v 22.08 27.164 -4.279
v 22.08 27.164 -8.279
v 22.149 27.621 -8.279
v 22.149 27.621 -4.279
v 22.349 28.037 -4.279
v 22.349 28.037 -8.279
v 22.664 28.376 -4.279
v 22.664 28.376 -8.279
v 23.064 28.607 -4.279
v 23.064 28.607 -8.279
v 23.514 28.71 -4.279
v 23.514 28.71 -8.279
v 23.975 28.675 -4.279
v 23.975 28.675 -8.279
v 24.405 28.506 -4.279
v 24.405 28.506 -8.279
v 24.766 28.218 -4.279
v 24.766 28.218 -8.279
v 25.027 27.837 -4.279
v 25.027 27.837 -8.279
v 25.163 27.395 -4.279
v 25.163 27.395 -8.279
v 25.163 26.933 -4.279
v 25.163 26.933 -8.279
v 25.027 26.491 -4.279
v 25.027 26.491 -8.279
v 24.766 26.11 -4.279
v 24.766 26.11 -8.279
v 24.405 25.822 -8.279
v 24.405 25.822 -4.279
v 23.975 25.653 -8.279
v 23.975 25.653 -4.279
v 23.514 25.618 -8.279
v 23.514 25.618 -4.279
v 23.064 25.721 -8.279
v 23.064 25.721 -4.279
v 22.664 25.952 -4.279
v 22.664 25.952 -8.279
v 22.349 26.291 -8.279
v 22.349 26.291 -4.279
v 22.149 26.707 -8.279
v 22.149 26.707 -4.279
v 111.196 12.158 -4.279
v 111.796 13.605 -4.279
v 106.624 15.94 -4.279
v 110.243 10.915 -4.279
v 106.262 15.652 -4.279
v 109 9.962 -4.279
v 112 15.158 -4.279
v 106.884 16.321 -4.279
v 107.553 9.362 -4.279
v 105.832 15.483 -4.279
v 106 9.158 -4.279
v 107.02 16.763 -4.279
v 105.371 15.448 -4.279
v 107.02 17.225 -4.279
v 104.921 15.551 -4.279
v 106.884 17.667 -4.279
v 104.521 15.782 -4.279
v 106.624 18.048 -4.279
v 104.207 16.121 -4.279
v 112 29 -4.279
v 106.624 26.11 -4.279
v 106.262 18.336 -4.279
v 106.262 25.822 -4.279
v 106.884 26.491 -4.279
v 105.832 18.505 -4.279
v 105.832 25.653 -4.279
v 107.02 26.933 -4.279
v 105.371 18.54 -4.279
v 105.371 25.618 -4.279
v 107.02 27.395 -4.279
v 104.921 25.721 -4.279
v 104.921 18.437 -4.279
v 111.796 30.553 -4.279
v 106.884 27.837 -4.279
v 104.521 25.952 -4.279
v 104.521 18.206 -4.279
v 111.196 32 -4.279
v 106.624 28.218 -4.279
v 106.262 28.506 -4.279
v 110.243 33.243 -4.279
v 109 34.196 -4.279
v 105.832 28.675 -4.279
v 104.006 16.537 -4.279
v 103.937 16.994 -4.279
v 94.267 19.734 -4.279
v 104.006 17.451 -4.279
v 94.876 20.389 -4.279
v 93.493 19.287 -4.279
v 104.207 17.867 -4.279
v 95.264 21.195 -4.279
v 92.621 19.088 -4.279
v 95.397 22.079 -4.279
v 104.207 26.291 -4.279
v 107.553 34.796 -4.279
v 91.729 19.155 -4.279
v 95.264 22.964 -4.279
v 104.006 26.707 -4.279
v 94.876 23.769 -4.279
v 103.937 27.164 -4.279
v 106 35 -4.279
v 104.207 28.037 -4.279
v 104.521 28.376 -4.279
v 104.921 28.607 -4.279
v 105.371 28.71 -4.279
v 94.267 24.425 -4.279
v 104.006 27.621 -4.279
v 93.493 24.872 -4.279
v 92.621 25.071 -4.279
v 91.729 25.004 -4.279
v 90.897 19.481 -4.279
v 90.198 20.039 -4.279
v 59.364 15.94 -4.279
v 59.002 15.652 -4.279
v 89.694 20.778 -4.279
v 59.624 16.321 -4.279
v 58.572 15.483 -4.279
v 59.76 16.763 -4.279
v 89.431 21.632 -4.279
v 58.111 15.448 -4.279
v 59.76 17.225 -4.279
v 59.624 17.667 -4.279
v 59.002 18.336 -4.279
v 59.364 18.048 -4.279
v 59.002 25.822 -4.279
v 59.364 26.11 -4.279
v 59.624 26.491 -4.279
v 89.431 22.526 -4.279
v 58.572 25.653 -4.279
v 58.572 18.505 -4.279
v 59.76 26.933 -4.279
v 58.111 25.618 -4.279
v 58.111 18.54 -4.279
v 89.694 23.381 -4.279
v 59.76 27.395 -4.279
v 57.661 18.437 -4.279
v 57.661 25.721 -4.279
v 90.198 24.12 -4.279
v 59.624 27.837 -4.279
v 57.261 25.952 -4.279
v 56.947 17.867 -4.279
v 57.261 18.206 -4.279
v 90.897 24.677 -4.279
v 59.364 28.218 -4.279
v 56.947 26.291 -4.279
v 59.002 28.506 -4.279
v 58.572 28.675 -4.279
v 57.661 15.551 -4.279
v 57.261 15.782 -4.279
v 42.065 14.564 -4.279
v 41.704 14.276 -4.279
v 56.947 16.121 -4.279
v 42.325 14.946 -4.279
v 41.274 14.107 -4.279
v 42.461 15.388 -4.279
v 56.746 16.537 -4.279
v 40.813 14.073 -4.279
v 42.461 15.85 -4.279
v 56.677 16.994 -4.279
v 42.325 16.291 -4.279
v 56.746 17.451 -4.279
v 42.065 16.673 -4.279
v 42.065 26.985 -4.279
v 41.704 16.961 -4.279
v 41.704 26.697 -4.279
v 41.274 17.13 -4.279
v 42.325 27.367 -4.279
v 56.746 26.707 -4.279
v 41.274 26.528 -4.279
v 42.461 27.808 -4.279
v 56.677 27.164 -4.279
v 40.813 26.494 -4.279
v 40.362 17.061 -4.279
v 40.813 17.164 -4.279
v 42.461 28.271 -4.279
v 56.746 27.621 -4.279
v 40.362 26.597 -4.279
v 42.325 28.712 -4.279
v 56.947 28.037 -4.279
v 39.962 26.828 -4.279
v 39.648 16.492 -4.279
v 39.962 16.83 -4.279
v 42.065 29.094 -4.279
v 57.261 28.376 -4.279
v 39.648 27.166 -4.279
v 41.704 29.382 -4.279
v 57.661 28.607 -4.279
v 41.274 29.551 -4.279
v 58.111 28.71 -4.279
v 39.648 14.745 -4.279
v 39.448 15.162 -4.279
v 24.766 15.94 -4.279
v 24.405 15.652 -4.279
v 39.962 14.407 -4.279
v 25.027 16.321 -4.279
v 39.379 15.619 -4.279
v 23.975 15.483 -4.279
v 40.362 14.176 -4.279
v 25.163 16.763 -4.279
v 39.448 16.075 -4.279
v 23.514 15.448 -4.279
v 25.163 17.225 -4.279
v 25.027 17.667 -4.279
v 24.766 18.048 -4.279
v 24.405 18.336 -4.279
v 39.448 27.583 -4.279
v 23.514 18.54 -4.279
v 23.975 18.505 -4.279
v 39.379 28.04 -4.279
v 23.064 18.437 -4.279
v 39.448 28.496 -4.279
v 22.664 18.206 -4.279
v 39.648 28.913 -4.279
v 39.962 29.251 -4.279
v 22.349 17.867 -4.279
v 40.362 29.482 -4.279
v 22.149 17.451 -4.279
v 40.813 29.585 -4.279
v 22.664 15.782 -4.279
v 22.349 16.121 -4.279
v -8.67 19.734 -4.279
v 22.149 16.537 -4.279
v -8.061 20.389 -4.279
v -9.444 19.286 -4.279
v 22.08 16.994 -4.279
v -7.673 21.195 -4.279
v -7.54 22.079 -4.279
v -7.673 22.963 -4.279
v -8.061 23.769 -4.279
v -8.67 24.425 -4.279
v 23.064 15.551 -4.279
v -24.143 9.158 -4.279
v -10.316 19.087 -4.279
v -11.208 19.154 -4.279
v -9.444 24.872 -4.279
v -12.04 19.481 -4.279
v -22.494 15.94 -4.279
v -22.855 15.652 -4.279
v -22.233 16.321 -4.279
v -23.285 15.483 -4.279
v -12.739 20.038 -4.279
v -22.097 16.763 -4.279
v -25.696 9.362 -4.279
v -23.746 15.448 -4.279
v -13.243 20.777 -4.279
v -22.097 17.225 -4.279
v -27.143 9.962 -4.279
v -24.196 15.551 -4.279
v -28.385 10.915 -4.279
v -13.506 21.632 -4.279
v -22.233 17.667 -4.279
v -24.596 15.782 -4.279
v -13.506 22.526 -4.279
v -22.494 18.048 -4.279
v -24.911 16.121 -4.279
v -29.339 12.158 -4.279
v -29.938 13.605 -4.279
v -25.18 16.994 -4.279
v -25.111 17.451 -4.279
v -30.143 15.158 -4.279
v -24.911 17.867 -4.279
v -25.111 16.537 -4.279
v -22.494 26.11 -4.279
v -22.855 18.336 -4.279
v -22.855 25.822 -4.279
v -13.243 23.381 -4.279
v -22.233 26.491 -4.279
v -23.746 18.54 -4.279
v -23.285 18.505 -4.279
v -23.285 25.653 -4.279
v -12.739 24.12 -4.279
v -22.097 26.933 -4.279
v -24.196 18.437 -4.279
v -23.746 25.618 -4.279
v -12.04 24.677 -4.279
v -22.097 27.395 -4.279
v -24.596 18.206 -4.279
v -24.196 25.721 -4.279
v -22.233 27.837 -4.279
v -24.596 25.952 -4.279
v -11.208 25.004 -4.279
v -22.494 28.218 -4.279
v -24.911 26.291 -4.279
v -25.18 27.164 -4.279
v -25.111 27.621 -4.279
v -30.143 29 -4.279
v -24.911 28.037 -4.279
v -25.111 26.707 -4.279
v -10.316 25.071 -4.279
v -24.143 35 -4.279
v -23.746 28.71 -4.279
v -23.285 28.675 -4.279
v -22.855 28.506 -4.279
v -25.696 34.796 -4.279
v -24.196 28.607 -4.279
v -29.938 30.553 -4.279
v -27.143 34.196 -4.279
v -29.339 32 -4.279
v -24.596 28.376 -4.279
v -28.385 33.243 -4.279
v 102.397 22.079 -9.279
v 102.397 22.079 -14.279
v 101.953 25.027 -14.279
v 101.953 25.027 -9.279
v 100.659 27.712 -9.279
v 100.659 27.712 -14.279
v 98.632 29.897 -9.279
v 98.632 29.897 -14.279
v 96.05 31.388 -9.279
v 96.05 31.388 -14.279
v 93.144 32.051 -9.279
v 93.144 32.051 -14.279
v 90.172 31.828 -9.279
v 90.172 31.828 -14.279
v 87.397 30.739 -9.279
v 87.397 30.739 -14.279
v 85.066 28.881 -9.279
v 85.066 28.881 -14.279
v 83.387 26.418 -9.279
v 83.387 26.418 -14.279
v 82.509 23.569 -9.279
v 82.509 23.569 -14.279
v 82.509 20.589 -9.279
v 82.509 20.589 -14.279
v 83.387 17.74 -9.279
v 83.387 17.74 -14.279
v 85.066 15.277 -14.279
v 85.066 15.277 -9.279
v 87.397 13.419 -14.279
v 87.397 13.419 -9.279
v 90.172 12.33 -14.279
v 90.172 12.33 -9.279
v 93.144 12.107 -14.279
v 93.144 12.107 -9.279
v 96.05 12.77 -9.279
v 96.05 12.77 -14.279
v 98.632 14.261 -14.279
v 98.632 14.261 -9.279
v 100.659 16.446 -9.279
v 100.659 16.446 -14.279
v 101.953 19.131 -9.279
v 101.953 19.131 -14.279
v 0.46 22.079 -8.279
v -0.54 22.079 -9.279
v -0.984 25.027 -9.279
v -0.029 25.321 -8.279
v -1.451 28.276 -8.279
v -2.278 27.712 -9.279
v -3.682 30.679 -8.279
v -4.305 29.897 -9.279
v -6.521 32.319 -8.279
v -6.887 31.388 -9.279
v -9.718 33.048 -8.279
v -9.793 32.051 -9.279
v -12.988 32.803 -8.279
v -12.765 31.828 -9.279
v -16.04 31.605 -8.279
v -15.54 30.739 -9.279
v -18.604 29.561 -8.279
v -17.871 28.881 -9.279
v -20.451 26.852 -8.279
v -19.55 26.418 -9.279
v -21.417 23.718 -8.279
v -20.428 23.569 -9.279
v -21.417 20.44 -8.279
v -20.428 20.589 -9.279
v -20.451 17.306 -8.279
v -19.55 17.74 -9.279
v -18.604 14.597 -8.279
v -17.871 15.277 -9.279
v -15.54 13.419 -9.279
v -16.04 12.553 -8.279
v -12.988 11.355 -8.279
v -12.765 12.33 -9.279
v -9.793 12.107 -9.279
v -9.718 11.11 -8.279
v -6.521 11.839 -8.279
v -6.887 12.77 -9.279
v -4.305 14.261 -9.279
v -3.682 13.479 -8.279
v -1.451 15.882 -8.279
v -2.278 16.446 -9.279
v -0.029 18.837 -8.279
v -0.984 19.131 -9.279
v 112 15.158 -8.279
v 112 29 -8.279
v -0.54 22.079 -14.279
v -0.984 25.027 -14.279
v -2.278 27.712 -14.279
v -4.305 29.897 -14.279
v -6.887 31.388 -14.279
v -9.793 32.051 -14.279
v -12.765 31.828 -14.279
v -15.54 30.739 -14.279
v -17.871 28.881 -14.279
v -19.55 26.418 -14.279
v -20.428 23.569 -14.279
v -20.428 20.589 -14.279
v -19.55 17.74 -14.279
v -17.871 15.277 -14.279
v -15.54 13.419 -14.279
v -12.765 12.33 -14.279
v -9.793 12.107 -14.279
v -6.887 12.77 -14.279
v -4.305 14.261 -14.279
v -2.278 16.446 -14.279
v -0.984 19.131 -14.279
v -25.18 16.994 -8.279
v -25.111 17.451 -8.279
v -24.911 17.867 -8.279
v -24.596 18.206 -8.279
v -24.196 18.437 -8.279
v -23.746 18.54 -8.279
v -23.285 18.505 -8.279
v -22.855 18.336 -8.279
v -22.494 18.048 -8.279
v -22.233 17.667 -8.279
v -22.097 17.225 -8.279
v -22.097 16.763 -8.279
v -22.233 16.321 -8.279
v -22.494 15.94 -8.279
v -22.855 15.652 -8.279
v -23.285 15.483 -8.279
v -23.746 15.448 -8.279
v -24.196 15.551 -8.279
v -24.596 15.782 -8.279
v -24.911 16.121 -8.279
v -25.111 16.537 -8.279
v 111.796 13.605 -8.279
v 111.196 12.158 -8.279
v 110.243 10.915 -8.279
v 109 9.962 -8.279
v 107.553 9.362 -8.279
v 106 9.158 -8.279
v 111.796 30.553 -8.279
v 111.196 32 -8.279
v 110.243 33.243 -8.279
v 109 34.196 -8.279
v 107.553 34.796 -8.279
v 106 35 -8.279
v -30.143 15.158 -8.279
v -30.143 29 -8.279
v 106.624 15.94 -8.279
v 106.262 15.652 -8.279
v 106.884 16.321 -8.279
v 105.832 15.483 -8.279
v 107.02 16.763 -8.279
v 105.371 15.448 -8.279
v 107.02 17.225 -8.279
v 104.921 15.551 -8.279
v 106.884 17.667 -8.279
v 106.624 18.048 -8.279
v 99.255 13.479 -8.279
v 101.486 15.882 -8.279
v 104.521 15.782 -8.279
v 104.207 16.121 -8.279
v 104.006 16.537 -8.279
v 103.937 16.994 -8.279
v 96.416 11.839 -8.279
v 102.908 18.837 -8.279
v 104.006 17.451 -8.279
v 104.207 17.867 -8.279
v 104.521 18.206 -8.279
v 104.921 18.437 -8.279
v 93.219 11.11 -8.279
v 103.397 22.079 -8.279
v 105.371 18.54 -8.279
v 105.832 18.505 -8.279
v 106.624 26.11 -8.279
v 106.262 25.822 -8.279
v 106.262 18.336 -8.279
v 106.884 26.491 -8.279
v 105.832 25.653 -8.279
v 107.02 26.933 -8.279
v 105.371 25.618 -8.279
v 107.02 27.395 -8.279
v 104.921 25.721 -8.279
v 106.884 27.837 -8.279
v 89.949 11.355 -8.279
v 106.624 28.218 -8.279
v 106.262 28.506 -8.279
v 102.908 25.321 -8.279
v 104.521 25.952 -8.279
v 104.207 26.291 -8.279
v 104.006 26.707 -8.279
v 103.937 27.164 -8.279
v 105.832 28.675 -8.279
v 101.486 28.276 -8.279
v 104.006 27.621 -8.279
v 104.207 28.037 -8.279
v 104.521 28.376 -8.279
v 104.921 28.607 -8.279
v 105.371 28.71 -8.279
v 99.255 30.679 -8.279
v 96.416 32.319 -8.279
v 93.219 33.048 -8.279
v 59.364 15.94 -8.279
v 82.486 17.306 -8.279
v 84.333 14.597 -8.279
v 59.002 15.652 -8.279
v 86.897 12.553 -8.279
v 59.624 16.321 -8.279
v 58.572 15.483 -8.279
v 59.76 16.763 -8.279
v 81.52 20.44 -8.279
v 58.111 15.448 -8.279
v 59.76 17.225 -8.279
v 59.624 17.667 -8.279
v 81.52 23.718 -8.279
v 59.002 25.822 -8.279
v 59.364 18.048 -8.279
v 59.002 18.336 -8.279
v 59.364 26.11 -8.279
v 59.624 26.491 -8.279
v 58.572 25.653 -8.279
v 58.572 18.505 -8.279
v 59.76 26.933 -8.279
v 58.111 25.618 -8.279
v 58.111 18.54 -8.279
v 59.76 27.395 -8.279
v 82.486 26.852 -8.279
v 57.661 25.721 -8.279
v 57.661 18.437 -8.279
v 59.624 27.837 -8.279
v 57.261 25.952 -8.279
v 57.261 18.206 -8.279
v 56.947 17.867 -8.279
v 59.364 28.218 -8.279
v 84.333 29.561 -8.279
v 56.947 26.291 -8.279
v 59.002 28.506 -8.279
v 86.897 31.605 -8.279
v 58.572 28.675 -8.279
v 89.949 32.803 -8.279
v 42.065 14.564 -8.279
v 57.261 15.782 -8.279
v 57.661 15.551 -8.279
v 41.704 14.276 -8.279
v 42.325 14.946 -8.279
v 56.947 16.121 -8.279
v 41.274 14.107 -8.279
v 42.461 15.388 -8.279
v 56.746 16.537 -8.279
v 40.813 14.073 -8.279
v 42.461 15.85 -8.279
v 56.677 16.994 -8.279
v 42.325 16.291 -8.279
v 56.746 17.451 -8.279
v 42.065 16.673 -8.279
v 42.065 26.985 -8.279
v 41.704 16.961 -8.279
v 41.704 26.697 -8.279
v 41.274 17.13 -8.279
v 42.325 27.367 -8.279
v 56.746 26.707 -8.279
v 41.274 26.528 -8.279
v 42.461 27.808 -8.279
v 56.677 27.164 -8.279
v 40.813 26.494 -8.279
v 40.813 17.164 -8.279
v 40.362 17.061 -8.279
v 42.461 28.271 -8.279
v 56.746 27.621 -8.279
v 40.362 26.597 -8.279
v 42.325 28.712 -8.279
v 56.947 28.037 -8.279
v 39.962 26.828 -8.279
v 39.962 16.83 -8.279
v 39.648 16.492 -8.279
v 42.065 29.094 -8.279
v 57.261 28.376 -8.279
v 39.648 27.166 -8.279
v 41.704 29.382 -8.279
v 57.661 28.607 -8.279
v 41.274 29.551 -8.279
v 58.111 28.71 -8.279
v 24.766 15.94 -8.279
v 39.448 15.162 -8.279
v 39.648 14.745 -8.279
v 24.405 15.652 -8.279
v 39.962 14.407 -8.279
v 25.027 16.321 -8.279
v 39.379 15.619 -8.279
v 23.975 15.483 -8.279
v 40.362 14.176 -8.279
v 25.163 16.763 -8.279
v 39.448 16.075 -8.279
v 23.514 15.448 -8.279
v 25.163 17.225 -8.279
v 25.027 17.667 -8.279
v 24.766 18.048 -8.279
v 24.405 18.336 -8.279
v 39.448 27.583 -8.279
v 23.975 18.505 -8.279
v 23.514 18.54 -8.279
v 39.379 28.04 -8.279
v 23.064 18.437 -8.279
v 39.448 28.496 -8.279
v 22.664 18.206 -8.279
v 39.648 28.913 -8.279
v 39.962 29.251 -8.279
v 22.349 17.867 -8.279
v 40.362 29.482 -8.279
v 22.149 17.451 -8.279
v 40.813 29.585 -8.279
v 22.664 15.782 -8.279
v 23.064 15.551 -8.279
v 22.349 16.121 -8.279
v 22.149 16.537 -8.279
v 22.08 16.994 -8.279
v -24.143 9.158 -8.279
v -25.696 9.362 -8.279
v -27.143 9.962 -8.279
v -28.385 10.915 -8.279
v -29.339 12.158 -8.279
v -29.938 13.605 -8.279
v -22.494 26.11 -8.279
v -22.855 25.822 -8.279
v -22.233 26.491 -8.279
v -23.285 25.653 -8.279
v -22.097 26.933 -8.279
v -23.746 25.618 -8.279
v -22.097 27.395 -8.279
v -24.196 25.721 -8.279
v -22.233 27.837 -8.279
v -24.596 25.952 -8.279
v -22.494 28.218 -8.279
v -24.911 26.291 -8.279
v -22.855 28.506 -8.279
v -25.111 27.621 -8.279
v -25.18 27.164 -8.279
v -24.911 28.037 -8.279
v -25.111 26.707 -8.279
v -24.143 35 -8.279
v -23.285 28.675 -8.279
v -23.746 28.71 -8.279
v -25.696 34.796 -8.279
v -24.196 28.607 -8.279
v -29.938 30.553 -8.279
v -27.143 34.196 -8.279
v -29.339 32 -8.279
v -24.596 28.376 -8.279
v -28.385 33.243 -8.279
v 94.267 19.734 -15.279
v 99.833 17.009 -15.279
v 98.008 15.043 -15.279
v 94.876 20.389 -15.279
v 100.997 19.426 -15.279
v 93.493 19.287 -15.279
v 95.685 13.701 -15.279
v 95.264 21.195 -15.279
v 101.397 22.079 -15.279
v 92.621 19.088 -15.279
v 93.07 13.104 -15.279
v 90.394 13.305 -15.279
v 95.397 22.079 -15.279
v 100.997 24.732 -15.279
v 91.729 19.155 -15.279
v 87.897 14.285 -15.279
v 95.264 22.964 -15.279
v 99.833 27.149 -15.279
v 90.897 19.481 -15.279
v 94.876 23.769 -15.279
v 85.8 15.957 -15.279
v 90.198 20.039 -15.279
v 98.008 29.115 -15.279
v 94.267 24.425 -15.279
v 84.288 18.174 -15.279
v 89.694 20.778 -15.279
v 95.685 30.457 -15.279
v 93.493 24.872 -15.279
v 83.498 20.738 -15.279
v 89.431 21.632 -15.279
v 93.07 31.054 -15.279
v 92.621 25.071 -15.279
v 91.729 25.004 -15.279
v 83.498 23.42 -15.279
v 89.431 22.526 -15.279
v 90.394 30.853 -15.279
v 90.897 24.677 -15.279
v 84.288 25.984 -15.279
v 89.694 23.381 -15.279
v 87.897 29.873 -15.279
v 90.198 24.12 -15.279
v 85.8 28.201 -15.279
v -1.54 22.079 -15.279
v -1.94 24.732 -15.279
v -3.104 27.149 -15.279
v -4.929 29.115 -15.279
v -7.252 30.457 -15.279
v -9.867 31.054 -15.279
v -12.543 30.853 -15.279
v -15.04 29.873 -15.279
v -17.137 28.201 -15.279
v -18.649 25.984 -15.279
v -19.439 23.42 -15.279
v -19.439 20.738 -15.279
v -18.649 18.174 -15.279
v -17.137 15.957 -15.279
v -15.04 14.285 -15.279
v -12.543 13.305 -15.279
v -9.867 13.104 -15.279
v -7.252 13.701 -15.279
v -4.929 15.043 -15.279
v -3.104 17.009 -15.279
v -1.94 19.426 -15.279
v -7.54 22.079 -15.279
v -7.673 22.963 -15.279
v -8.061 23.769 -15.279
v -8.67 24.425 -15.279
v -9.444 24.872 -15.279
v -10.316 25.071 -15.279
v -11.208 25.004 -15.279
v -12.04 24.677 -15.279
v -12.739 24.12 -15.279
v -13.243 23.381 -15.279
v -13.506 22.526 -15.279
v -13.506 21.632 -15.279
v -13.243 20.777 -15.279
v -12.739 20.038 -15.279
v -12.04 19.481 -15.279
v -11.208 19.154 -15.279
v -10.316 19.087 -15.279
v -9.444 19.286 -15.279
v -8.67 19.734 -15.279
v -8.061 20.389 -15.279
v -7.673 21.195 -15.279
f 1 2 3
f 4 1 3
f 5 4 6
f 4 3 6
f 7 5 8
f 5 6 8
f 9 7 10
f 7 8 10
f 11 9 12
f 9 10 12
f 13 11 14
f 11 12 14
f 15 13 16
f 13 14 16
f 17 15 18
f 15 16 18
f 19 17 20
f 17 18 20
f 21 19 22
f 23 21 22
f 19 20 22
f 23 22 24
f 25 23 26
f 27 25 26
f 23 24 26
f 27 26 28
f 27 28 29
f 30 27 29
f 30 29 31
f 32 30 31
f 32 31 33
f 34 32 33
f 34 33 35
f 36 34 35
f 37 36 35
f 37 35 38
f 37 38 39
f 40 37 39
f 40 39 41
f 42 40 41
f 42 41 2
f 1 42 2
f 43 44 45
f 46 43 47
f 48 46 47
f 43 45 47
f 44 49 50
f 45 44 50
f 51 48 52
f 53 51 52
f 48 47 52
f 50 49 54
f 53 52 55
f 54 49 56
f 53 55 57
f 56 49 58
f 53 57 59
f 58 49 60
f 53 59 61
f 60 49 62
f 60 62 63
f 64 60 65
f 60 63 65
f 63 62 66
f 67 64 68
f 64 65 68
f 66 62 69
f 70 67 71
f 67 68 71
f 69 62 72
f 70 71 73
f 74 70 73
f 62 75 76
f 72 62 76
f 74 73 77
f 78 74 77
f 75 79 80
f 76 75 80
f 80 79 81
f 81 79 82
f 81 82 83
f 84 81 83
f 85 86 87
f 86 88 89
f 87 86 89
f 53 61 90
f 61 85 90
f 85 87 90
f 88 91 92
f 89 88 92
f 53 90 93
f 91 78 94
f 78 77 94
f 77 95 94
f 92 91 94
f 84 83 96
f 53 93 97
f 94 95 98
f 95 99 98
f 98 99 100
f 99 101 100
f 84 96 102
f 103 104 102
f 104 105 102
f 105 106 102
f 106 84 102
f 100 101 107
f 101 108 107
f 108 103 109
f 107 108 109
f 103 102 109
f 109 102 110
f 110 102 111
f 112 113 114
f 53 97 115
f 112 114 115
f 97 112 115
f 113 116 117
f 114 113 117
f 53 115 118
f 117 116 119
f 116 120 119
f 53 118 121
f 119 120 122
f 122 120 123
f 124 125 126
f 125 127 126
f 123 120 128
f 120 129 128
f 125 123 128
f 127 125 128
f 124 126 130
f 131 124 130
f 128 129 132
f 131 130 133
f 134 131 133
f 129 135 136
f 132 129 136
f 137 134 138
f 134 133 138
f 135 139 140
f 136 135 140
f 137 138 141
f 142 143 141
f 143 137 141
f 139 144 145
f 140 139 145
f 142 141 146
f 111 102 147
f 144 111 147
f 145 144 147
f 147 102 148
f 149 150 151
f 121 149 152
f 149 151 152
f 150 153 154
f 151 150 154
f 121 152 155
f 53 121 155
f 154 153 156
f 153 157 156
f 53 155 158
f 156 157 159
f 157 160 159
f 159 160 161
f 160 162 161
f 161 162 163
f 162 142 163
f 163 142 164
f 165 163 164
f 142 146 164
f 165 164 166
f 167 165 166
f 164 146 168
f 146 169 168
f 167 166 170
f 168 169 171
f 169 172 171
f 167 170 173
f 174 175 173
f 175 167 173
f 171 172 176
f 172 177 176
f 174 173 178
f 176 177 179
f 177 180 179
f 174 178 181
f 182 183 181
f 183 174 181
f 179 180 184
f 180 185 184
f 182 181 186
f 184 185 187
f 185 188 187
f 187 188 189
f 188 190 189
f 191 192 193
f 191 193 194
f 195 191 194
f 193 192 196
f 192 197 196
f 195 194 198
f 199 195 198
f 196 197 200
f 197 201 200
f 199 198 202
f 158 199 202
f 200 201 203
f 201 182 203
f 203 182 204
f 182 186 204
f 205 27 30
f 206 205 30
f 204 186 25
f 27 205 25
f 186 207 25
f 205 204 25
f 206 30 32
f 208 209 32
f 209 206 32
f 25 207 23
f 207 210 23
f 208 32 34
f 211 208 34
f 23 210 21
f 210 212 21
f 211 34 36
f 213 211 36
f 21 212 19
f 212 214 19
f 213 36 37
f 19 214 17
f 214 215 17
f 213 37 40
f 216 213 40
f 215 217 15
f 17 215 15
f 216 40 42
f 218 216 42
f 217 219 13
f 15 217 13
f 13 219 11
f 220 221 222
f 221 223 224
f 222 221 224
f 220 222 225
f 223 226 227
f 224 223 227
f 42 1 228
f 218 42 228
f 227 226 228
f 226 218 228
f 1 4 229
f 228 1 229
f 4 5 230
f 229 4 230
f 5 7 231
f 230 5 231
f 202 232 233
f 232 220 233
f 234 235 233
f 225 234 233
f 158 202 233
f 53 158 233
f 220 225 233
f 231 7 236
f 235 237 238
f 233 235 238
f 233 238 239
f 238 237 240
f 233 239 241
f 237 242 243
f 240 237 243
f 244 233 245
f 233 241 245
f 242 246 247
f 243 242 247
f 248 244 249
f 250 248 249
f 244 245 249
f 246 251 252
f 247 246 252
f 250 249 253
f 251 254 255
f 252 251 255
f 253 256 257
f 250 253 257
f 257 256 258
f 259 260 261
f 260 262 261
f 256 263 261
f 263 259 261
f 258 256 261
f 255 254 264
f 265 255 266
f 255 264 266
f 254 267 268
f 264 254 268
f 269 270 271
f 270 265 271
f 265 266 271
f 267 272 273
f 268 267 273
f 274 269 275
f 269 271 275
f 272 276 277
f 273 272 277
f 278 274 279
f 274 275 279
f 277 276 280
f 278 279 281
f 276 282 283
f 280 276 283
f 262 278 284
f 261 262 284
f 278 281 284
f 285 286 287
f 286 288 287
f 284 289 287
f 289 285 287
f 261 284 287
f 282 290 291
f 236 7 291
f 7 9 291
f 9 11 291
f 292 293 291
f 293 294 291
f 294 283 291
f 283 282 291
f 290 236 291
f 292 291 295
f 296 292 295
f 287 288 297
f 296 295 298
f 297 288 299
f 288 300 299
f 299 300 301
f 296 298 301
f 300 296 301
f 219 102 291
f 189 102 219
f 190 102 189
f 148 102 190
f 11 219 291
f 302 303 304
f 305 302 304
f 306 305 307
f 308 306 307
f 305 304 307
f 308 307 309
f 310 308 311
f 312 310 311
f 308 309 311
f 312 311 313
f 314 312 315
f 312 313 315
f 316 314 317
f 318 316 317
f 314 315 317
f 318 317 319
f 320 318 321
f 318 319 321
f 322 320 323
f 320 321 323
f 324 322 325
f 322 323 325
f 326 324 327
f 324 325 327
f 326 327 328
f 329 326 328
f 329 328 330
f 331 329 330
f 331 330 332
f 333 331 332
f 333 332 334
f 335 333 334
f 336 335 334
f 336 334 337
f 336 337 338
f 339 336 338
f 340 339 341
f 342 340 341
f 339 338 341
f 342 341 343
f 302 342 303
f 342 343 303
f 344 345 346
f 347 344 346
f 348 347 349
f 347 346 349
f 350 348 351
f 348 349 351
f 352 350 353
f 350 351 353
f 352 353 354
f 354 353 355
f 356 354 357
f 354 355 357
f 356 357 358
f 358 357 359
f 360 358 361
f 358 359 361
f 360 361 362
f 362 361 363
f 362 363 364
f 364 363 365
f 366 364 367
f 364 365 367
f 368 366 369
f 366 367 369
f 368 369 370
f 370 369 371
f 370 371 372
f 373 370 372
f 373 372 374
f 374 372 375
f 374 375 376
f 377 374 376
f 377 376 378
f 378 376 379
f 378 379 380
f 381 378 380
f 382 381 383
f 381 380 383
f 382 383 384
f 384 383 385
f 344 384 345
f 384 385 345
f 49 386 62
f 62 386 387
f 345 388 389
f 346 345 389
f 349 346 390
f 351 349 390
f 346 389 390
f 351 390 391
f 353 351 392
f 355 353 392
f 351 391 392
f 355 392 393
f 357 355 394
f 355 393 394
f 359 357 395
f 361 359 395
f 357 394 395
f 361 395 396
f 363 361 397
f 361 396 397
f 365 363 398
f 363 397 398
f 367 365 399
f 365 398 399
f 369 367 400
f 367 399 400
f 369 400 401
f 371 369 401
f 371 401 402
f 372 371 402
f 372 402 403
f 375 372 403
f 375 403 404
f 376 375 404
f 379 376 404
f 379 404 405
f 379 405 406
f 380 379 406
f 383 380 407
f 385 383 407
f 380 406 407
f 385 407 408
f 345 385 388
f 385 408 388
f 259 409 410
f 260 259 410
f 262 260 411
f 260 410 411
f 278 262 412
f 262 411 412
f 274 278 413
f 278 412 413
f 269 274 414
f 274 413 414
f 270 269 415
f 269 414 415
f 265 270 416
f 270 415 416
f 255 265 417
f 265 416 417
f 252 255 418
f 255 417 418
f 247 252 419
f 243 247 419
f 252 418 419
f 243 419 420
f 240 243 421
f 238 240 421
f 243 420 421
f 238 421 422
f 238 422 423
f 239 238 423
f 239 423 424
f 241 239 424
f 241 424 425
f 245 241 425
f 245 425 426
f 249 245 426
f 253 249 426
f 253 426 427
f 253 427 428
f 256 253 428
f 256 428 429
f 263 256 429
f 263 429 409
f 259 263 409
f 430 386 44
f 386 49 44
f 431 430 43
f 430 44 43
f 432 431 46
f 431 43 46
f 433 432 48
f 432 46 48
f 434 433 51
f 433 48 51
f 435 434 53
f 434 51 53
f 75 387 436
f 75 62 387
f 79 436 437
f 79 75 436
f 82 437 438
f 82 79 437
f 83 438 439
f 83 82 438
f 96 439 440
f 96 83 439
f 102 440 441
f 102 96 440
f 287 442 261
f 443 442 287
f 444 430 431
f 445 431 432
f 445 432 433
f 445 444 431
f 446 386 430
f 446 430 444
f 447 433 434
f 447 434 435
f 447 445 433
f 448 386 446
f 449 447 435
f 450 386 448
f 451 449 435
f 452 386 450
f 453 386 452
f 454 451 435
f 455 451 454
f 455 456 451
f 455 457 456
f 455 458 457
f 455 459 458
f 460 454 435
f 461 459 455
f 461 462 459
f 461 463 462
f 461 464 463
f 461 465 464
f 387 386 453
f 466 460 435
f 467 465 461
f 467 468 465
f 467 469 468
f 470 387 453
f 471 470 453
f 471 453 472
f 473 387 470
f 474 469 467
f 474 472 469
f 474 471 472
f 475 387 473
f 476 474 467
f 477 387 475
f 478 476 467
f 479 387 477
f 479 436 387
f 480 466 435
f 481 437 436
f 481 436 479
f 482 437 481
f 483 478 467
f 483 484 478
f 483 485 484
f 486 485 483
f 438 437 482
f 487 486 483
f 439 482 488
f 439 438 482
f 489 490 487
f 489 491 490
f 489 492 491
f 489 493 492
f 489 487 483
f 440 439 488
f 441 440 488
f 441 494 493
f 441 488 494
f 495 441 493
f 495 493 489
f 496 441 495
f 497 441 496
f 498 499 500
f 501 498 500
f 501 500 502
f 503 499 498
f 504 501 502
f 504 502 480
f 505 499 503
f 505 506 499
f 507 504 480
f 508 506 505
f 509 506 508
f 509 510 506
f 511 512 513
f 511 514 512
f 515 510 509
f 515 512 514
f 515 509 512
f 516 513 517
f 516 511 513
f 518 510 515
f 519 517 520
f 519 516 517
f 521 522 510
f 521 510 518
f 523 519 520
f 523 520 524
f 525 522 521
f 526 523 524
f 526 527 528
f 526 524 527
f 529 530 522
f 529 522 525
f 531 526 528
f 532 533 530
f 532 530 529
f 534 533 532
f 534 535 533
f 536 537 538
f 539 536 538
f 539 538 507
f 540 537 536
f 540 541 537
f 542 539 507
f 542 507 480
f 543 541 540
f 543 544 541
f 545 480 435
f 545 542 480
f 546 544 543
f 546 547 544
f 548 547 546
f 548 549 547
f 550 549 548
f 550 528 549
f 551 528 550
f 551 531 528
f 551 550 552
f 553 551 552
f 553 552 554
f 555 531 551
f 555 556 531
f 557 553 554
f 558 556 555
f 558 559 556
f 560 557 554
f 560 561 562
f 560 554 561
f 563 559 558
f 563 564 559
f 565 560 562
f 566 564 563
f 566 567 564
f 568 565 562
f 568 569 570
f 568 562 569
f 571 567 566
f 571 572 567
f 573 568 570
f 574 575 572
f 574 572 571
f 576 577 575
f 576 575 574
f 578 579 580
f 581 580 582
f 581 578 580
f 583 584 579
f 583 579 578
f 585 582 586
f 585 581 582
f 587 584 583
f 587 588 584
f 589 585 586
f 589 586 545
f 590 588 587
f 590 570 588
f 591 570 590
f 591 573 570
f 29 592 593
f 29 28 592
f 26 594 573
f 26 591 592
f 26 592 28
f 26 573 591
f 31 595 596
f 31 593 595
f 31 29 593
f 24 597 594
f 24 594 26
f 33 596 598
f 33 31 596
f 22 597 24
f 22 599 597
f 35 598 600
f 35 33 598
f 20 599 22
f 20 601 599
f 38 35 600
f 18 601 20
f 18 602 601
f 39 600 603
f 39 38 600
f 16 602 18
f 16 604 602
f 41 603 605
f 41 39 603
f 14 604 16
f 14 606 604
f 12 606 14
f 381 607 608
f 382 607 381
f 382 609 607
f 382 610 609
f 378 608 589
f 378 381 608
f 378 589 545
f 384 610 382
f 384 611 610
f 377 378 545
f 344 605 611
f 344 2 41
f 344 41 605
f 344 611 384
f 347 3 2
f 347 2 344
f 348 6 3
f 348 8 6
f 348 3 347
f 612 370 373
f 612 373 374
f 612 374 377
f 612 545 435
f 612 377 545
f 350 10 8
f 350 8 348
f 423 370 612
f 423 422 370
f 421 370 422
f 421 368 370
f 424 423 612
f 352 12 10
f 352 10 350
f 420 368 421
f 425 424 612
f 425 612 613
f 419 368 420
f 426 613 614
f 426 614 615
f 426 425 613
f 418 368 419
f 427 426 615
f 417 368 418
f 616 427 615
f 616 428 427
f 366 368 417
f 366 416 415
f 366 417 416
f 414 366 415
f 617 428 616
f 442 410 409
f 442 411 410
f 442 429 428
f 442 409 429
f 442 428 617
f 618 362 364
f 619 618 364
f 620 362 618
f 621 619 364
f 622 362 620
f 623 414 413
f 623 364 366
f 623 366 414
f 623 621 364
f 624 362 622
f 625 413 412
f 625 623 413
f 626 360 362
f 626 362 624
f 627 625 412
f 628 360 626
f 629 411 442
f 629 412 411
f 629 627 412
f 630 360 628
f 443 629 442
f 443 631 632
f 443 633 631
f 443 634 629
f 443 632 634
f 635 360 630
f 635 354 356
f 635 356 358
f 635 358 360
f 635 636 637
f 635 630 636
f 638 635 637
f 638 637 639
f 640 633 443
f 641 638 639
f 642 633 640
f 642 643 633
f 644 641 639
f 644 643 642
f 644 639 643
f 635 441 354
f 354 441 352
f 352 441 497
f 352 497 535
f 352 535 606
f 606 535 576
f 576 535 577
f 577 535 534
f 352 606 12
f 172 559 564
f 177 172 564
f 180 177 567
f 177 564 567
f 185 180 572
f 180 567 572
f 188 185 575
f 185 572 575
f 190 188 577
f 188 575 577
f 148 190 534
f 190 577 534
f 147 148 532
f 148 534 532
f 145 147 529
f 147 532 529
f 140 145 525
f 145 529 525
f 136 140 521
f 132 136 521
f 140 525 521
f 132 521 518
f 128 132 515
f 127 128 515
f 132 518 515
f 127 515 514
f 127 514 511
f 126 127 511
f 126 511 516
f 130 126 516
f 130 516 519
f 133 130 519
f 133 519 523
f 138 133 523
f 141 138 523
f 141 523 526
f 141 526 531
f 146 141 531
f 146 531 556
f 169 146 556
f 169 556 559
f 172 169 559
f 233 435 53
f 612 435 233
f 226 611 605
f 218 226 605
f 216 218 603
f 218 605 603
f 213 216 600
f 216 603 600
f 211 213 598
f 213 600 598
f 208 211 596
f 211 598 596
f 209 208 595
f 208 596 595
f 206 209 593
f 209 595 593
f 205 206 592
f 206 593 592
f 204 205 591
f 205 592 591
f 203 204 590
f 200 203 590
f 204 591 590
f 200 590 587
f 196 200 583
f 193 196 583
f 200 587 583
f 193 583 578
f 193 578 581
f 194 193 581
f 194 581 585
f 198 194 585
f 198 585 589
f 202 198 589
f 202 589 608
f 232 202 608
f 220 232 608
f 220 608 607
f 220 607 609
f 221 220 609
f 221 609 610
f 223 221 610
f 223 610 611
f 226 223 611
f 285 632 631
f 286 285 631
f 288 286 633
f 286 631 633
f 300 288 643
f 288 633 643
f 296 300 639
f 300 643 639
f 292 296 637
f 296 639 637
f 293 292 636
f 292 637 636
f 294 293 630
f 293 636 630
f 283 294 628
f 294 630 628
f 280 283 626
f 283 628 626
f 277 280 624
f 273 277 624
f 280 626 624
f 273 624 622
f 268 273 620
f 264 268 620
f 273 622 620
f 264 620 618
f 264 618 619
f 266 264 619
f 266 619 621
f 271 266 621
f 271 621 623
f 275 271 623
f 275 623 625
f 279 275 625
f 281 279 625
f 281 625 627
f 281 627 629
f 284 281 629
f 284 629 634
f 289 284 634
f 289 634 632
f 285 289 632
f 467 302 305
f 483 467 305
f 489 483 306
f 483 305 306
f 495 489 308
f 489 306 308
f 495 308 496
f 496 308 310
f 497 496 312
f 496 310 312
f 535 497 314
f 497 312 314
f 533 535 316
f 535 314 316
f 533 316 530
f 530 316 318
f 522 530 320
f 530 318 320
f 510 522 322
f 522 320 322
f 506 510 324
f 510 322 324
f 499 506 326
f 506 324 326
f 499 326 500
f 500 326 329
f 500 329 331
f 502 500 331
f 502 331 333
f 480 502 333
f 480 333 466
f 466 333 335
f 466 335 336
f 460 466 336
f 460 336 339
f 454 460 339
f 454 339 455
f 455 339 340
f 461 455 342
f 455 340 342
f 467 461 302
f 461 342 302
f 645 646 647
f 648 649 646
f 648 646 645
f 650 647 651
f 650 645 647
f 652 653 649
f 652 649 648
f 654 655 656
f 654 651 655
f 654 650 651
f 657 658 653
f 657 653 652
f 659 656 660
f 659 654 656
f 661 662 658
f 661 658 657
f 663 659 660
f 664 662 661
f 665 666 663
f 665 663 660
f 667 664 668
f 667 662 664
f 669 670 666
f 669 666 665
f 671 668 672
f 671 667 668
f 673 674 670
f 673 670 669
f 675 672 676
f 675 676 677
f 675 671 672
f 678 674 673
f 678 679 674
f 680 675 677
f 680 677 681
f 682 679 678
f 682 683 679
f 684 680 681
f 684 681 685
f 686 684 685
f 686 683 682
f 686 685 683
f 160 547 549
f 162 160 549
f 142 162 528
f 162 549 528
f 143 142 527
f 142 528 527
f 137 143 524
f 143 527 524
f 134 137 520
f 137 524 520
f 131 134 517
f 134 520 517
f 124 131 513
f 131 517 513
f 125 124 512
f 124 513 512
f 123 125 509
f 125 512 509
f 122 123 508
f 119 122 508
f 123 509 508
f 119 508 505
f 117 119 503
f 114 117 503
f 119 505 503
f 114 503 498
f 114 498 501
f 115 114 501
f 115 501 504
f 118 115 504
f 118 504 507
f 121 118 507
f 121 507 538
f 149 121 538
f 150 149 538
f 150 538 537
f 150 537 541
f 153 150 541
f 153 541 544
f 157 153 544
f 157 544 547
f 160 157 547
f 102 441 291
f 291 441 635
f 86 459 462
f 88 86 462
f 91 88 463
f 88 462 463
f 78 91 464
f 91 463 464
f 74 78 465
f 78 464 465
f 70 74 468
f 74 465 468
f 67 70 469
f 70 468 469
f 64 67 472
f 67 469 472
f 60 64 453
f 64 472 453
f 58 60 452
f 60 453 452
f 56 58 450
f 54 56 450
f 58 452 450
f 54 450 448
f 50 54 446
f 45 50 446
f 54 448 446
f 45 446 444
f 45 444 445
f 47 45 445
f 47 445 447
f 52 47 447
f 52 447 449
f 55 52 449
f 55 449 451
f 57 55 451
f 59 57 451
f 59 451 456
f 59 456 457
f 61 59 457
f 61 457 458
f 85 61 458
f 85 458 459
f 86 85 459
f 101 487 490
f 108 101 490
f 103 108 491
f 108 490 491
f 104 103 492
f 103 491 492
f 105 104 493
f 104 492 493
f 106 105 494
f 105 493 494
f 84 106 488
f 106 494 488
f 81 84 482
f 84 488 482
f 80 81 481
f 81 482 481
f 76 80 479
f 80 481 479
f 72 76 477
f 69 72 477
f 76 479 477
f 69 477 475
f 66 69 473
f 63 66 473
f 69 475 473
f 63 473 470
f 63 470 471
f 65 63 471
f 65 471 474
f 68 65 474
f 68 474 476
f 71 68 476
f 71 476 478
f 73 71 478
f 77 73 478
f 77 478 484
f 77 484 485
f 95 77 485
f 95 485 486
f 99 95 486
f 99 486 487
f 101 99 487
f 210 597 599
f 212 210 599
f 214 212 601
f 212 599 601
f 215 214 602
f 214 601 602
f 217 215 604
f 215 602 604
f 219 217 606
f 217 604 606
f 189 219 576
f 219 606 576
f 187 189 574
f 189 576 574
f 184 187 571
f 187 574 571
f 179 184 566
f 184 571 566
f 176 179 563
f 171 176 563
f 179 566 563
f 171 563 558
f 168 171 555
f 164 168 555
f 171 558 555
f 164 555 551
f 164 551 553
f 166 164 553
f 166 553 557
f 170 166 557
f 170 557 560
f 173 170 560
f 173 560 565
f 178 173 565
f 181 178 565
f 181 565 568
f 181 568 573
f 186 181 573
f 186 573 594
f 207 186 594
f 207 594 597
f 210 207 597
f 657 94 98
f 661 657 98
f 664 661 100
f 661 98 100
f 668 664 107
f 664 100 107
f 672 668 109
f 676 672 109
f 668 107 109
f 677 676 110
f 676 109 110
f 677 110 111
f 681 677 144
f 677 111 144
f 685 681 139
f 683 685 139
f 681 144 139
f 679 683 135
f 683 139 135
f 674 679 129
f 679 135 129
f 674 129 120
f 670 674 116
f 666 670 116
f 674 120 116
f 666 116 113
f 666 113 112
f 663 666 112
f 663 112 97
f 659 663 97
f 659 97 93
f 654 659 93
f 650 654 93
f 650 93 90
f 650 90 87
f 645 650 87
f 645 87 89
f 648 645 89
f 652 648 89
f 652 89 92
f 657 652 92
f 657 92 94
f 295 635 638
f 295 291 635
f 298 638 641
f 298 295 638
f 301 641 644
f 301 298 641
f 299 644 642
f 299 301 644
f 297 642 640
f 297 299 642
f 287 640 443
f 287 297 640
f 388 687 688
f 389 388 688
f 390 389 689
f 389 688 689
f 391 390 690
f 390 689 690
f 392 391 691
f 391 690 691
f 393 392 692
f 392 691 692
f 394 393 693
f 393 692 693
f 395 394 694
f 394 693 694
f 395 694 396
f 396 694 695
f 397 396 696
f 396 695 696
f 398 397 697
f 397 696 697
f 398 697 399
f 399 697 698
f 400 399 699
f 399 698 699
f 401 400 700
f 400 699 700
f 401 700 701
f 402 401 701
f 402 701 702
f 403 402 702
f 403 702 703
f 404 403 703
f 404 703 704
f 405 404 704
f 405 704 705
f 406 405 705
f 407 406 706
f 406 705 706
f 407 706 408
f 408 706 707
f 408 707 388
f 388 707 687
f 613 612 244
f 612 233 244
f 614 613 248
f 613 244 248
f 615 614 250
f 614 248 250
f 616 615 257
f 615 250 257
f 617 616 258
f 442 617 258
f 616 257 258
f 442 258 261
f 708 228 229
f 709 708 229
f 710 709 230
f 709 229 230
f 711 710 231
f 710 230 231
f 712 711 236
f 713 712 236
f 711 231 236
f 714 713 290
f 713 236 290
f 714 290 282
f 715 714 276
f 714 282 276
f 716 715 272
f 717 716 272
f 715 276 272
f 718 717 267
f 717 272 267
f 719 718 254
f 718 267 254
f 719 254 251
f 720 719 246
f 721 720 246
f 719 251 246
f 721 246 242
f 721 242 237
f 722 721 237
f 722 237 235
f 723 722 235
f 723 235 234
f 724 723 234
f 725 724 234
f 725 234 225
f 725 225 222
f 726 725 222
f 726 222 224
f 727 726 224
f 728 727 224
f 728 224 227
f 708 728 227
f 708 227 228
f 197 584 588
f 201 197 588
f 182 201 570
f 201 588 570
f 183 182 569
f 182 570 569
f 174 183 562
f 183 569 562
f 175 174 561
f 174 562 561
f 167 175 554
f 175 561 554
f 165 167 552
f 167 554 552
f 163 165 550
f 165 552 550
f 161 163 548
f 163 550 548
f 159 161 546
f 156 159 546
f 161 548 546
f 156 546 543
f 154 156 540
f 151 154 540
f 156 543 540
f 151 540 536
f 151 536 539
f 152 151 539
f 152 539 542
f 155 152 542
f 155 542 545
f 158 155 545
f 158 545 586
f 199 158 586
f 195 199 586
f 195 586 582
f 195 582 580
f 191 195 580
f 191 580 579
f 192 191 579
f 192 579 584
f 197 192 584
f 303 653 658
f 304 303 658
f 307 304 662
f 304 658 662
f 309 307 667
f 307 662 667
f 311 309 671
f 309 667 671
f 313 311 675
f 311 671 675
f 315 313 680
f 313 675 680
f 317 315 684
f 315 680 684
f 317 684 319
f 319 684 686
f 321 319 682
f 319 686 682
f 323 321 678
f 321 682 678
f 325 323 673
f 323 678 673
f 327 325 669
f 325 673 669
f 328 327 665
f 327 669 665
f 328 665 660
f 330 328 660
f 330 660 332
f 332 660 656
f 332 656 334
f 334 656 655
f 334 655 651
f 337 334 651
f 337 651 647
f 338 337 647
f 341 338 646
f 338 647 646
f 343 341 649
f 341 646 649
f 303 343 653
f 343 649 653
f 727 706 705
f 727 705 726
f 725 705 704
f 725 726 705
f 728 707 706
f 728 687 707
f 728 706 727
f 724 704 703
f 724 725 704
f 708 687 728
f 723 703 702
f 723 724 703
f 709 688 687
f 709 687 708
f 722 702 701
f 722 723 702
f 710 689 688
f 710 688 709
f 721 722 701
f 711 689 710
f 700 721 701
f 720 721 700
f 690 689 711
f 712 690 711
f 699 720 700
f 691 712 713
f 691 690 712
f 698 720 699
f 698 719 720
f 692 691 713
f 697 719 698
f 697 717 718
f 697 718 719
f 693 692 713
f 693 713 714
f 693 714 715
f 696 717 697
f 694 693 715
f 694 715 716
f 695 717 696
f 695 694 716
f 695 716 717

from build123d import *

# Parameters (mm, degrees)
SKETCH1_W                      = 142.142719433
SKETCH1_H                      = 25.841975708
BOSS_EXTRUDE1_DEPTH            = 4
SKETCH2_W                      = 10
SKETCH2_H                      = 7
SKETCH3_W                      = 10
SKETCH3_H                      = 7
F_3_1_3_1_DIAMETER_HOLE1_D     = 3.1
F_3_1_3_1_DIAMETER_HOLE1_DEPTH = 11
F_6_0_6_DIAMETER_HOLE1_D       = 6
CHAMFER1_SIZE                  = 1
FILLET1_R                      = 6


with BuildPart() as part:
    # Sketch1 → Boss-Extrude1 (new body)
    with BuildSketch(Plane(origin=(0, 0, -8.279012494), x_dir=(-1, 0, 0), z_dir=(0, 0, -1))):
        with Locations((-40.928641953, 22.079012221)):
            Rectangle(SKETCH1_W, SKETCH1_H)
    extrude(amount=-BOSS_EXTRUDE1_DEPTH)

    # Sketch2 → Revolve1 (revolve)
    with BuildSketch(Plane(origin=(0, 22.079011948, 0), x_dir=(1, 0, 0), z_dir=(0, 1, 0))):
        with Locations((-5.54, 11.779012494)):
            Rectangle(SKETCH2_W, SKETCH2_H)
    revolve(axis=Axis((-10.54, 22.079011948, -15.279012494), (0, 0, 1)))

    # Sketch3 → Revolve2 (revolve)
    with BuildSketch(Plane(origin=(0, 22.079011948, 0), x_dir=(1, 0, 0), z_dir=(0, 1, 0))):
        with Locations((97.397001672, 11.779012494)):
            Rectangle(SKETCH3_W, SKETCH3_H)
    revolve(axis=Axis((92.397001672, 22.079011948, -15.279012494), (0, 0, 1)))

    # Ø3.1 (3.1) Diameter Hole1
    with Locations(Plane.XY.offset(-4.279012494)):
        with Locations((40.928641952, 28.039506364), (40.928641952, 15.618518294), (58.227283905, 27.164012494), (23.63, 27.164011948), (-23.63, 27.164011948), (-23.63, 16.994011948), (23.63, 16.994011948), (58.227283905, 16.994012494), (105.487283905, 27.164012494), (105.487283905, 16.994012494)):
            Hole(F_3_1_3_1_DIAMETER_HOLE1_D / 2, depth=F_3_1_3_1_DIAMETER_HOLE1_DEPTH)

    # Ø6.0 (6) Diameter Hole1 (through all)
    with Locations(Plane(origin=(0, 0, -15.279012494), x_dir=(-1, 0, 0), z_dir=(0, 0, -1))):
        with Locations((-92.397001672, 22.079344118), (10.54, 22.079011948)):
            Hole(F_6_0_6_DIAMETER_HOLE1_D / 2)

    # Chamfer1
    chamfer1_edges = [part.edges().sort_by_distance(p)[0] for p in [
        (-20.54, 22.079011948, -8.279012494),
        (-20.54, 22.079011948, -15.279012494),
        (82.397001672, 22.079011948, -8.279012494),
        (82.397001672, 22.079011948, -15.279012494),
    ]]
    chamfer(chamfer1_edges, length=CHAMFER1_SIZE)

    # Fillet1
    fillet1_edges = [part.edges().sort_by_distance(p)[0] for p in [
        (112.000001669, 35.000000075, -6.279012494),
        (-30.142717764, 35.000000075, -6.279012494),
        (-30.142717764, 9.158024367, -6.279012494),
        (112.000001669, 9.158024367, -6.279012494),
    ]]
    fillet(fillet1_edges, radius=FILLET1_R)


solid = part.part
